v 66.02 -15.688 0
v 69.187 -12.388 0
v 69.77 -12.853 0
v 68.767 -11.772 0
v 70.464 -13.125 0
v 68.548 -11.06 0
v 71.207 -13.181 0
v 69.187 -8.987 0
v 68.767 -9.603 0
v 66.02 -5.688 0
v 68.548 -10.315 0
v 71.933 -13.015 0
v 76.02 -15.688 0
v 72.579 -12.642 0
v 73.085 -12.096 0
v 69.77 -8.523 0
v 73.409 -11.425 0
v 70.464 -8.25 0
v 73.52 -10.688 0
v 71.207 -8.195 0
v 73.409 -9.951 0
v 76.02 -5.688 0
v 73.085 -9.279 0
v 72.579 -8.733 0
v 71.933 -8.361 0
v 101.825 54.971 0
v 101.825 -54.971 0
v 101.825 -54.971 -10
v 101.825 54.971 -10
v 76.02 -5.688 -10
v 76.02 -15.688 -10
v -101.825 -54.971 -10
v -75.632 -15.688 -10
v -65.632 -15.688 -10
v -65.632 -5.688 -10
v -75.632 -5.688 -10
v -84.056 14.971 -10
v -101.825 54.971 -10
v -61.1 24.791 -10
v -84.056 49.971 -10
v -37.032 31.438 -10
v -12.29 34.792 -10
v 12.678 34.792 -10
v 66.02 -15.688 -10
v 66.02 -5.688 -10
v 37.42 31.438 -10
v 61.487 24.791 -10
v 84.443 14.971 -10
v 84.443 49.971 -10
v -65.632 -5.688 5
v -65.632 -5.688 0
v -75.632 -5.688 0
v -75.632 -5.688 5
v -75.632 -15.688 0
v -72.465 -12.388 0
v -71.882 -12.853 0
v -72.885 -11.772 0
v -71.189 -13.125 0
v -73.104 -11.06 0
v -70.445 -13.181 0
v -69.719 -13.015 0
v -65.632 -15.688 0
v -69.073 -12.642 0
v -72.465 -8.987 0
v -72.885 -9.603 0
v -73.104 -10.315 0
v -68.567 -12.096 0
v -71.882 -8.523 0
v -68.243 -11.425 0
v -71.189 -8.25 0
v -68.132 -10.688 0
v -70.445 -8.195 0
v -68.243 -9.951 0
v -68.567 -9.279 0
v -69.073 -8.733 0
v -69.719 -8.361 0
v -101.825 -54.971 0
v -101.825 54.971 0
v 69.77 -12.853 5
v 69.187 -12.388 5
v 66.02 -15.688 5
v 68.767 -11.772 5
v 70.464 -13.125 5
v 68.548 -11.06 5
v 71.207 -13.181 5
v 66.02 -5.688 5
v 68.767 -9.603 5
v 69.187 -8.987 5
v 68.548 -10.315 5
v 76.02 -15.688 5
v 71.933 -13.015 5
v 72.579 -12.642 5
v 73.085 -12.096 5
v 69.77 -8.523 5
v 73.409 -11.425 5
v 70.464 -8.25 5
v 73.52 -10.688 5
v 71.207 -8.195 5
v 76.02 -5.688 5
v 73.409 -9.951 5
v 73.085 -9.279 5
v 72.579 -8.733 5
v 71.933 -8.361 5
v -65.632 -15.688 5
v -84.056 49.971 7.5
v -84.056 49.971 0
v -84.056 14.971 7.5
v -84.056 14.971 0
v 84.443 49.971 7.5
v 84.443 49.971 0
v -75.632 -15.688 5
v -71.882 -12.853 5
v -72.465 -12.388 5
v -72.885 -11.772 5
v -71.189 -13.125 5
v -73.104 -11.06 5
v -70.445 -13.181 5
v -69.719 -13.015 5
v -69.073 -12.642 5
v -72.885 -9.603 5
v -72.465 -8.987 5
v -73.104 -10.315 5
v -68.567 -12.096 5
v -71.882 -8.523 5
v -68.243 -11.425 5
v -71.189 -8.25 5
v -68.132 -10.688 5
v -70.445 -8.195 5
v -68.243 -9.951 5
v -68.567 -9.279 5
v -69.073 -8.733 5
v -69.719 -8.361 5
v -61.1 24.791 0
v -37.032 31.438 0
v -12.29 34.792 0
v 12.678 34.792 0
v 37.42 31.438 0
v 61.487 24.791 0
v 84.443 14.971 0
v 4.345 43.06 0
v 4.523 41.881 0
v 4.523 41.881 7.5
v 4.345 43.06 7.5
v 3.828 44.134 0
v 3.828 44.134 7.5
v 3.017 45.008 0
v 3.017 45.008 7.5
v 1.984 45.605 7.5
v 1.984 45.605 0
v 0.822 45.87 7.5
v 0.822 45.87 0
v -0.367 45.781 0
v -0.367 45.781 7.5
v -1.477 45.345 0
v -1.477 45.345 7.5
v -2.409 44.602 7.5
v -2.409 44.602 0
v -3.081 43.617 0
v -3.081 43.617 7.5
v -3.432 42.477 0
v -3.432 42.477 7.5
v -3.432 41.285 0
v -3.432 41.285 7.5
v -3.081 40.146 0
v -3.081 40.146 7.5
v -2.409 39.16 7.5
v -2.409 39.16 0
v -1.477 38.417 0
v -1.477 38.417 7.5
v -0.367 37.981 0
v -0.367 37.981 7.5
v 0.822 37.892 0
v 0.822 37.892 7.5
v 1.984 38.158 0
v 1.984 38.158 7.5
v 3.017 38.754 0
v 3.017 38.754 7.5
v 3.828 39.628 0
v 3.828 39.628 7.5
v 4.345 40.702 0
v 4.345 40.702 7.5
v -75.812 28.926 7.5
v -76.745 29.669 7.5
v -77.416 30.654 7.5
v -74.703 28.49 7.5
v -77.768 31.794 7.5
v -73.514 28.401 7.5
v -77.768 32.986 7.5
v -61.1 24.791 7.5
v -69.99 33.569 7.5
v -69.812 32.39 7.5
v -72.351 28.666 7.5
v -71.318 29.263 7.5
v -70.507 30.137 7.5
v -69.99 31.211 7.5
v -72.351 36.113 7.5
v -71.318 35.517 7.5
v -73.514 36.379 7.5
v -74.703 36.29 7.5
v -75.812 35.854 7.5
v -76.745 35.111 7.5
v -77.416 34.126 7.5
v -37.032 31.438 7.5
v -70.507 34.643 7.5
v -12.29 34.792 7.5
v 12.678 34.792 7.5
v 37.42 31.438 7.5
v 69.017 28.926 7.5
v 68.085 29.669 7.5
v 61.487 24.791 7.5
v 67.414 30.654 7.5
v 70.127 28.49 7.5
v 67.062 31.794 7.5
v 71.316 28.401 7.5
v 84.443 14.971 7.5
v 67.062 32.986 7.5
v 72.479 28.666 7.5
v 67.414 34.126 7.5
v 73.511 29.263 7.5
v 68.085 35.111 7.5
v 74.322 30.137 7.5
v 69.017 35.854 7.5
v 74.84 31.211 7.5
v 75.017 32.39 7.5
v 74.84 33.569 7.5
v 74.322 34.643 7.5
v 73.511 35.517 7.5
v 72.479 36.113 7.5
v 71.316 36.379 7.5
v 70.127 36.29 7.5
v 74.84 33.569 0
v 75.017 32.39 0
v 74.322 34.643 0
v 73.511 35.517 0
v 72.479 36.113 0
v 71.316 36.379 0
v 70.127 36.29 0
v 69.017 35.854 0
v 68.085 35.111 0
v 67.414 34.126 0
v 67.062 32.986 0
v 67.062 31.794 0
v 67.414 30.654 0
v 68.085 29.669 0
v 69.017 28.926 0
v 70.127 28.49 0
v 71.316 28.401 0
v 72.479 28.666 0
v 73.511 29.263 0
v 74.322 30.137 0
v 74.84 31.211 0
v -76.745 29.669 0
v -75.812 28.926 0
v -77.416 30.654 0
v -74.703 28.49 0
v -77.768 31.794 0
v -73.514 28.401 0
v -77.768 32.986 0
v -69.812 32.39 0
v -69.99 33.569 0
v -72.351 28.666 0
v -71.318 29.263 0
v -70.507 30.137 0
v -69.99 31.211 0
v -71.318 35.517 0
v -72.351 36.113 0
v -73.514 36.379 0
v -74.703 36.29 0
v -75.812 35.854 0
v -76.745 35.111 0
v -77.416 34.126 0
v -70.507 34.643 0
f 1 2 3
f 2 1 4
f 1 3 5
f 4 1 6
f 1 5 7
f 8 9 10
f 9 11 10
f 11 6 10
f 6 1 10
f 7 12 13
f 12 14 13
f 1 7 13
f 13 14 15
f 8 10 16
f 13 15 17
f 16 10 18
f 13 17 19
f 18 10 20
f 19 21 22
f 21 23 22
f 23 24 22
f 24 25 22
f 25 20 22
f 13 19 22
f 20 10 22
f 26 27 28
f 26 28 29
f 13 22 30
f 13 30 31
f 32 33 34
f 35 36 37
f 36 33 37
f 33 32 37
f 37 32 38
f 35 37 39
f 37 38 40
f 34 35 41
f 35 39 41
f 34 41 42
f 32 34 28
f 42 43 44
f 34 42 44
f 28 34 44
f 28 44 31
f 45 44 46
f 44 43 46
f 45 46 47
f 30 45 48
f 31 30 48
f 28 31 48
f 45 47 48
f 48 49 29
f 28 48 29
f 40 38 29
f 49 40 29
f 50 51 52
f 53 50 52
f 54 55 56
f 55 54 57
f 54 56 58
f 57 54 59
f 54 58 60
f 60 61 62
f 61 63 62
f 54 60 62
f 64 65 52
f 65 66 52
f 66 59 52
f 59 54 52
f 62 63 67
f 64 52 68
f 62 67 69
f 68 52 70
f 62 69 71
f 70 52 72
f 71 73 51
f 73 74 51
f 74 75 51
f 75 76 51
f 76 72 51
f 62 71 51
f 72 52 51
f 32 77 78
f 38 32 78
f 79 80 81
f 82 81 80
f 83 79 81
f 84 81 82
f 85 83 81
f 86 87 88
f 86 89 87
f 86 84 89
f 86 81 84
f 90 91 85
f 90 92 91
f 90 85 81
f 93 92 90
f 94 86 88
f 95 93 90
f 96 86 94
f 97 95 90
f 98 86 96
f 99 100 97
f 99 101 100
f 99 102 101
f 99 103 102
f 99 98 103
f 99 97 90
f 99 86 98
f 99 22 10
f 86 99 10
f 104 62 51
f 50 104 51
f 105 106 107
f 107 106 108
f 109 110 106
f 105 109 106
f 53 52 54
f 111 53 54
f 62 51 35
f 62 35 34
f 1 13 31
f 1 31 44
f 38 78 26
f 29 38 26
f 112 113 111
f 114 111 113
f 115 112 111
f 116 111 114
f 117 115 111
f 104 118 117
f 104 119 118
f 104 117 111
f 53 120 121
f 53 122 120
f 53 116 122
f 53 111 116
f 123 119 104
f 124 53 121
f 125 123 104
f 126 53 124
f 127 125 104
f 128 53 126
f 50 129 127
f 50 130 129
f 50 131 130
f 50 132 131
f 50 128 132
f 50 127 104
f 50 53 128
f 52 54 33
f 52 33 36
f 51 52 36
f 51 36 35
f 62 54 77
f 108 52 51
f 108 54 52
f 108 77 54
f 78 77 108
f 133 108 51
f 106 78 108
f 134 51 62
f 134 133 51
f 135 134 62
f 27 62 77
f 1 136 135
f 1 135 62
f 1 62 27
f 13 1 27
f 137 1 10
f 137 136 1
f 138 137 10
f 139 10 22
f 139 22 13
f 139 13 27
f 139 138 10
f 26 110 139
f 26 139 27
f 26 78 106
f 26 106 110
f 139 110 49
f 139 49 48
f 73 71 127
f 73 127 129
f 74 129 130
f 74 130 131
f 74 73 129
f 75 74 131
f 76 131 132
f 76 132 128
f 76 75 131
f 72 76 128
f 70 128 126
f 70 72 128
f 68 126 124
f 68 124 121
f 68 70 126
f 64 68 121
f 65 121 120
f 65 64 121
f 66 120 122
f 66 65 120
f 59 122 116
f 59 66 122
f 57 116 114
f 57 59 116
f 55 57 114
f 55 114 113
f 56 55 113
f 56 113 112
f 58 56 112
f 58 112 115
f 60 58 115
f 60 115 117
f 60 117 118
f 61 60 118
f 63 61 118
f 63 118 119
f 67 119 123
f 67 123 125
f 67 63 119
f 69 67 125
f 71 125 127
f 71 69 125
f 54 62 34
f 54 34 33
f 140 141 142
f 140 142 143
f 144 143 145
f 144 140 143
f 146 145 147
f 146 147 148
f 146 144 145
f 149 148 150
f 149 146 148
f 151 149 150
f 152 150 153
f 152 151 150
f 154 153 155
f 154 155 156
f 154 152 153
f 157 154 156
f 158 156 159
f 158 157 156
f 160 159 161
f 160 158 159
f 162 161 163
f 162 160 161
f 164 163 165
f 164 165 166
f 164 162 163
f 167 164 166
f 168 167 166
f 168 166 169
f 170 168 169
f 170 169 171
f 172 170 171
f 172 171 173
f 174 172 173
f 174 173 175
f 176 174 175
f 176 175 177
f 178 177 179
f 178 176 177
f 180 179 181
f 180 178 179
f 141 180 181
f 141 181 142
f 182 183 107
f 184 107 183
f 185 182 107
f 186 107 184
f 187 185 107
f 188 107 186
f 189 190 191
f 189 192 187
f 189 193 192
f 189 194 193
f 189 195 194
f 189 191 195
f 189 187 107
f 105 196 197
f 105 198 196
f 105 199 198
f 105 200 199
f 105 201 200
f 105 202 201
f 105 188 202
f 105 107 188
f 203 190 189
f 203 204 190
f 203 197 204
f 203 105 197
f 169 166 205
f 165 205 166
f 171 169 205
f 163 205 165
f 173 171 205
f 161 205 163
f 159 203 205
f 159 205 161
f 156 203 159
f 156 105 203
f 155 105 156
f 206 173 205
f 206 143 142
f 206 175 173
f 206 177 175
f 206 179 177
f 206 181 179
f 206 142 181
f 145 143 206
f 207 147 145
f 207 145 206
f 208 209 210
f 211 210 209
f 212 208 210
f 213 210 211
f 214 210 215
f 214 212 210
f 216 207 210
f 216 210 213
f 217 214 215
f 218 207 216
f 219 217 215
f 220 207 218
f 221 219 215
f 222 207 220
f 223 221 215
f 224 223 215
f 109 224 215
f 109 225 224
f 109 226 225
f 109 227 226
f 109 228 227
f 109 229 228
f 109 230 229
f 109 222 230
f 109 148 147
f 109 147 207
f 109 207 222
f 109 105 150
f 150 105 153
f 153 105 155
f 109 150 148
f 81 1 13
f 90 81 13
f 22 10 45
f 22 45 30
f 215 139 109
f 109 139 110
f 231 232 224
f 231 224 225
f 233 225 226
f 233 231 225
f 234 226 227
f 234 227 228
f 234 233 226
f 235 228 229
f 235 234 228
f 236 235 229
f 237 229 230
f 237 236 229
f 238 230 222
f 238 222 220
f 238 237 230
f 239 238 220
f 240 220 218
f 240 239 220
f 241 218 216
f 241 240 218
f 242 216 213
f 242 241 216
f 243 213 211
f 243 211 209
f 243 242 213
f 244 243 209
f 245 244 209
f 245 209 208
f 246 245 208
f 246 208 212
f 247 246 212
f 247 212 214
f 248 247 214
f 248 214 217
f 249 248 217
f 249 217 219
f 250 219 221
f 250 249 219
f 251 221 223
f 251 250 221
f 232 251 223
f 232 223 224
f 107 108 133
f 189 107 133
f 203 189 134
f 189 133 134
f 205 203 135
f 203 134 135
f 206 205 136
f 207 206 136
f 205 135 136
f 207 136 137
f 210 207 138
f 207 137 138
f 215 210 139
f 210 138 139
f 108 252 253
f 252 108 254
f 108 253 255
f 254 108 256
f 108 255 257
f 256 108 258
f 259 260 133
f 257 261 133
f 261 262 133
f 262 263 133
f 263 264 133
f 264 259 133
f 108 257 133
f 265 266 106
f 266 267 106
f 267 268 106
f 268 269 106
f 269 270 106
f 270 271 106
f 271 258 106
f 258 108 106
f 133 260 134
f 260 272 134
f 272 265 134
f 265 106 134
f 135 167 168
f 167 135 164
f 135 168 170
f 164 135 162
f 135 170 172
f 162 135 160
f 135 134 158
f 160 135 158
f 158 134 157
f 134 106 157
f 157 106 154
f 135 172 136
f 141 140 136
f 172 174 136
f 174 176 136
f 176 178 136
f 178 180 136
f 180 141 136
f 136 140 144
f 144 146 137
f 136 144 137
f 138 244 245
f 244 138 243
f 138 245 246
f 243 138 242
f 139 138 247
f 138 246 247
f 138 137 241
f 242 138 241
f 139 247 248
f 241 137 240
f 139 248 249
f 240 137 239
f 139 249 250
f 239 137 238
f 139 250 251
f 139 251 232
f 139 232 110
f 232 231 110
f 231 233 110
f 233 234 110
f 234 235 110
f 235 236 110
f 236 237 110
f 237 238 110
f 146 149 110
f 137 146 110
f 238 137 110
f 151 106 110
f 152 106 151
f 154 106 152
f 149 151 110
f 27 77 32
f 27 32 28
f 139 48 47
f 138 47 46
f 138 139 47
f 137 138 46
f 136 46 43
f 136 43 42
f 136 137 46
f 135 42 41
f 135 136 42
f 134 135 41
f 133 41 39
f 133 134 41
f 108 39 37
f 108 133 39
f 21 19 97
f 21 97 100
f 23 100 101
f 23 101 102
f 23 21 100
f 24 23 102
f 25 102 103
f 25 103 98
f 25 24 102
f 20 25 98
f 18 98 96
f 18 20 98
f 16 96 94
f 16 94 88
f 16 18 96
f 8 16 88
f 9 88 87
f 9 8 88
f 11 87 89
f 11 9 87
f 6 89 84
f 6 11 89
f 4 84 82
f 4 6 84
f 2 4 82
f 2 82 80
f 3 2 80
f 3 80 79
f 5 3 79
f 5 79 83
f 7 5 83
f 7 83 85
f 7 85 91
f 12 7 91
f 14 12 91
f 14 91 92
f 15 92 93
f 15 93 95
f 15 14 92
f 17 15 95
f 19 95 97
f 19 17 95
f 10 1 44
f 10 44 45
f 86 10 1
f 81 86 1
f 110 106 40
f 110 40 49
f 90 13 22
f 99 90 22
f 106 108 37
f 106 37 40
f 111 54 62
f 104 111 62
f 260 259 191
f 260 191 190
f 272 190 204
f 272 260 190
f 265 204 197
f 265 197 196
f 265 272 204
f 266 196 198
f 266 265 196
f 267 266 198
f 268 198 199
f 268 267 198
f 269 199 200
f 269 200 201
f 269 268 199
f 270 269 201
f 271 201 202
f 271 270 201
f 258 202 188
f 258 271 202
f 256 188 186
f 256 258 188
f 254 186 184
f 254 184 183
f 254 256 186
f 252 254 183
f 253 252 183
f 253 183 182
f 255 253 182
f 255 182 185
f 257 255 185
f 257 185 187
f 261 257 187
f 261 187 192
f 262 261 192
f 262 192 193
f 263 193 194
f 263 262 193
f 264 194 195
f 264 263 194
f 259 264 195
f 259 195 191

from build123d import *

# Parameters (mm, degrees)
F0_R     = 4
F1_DEPTH = 7.5
F0_R_2   = 2.5
F2_DEPTH = 5
F0_W     = 203.6497449993
F0_H     = 109.9428115989
F4_DEPTH = 10


# Not quite as in the source:
# - the program builds the solid bodies; features that only make, move or delete a surface that nothing else refers to are left out


with BuildPart() as f1:
    # F0 (on Top) → F1 (new body)
    with BuildSketch(Plane.XY):
        with BuildLine():
            Line((84.4433900163, 14.9714057995), (84.4433900163, 49.9714057995))
            Line((84.4433900163, 49.9714057995), (-84.0557436719, 49.9714057995))
            Line((-84.0557436719, 49.9714057995), (-84.0557436719, 14.9714057995))
            ThreePointArc((-84.0557436719, 14.9714057995), (0.1938231722, 35.2128277571), (84.4433900163, 14.9714057995))
        make_face()
        with Locations((-73.8124497916, 32.3899931005)):
            Circle(F0_R, mode=Mode.SUBTRACT)
        with Locations((0.5230791285, 41.8811105192)):
            Circle(F0_R, mode=Mode.SUBTRACT)
        with Locations((71.0174008963, 32.3899931005)):
            Circle(F0_R, mode=Mode.SUBTRACT)
    extrude(amount=F1_DEPTH)


with BuildPart() as f2:
    # F0 (on Top) → F2 (new body)
    with BuildSketch(Plane.XY):
        Polygon((-65.6322131381, -15.68778418), (-65.6322131381, -8.2608617701), (-65.6322131381, -5.68778418), (-75.6322131381, -5.68778418), (-75.6322131381, -15.68778418), align=None)
        with Locations((-70.6322131381, -10.68778418)):
            Circle(F0_R_2, mode=Mode.SUBTRACT)
    extrude(amount=F2_DEPTH)


with BuildPart() as f2b:
    # F0 (on Top) → F2, piece 2 (new body)
    with BuildSketch(Plane.XY):
        Polygon((66.0198594824, -5.68778418), (66.0198594824, -8.2608617701), (66.0198594824, -15.68778418), (76.0198594824, -15.68778418), (76.0198594824, -5.68778418), align=None)
        with Locations((71.0198594824, -10.68778418)):
            Circle(F0_R_2, mode=Mode.SUBTRACT)
    extrude(amount=F2_DEPTH)


with BuildPart() as f4:
    # F0 (on Top) → F4 (new body)
    with BuildSketch(Plane.XY):
        Rectangle(F0_W, F0_H)
        Polygon((-65.6322131381, -5.68778418), (-65.6322131381, -8.2608617701), (-65.6322131381, -15.68778418), (-75.6322131381, -15.68778418), (-75.6322131381, -5.68778418), align=None, mode=Mode.SUBTRACT)
        Polygon((66.0198594824, -15.68778418), (66.0198594824, -8.2608617701), (66.0198594824, -5.68778418), (76.0198594824, -5.68778418), (76.0198594824, -15.68778418), align=None, mode=Mode.SUBTRACT)
        with BuildLine():
            Line((-84.0557436719, 49.9714057995), (84.4433900163, 49.9714057995))
            Line((84.4433900163, 49.9714057995), (84.4433900163, 14.9714057995))
            ThreePointArc((84.4433900163, 14.9714057995), (0.1938231722, 35.2128277571), (-84.0557436719, 14.9714057995))
            Line((-84.0557436719, 14.9714057995), (-84.0557436719, 49.9714057995))
        make_face(mode=Mode.SUBTRACT)
    extrude(amount=-F4_DEPTH)


solid = Compound([f1.part, f2.part, f2b.part, f4.part])
